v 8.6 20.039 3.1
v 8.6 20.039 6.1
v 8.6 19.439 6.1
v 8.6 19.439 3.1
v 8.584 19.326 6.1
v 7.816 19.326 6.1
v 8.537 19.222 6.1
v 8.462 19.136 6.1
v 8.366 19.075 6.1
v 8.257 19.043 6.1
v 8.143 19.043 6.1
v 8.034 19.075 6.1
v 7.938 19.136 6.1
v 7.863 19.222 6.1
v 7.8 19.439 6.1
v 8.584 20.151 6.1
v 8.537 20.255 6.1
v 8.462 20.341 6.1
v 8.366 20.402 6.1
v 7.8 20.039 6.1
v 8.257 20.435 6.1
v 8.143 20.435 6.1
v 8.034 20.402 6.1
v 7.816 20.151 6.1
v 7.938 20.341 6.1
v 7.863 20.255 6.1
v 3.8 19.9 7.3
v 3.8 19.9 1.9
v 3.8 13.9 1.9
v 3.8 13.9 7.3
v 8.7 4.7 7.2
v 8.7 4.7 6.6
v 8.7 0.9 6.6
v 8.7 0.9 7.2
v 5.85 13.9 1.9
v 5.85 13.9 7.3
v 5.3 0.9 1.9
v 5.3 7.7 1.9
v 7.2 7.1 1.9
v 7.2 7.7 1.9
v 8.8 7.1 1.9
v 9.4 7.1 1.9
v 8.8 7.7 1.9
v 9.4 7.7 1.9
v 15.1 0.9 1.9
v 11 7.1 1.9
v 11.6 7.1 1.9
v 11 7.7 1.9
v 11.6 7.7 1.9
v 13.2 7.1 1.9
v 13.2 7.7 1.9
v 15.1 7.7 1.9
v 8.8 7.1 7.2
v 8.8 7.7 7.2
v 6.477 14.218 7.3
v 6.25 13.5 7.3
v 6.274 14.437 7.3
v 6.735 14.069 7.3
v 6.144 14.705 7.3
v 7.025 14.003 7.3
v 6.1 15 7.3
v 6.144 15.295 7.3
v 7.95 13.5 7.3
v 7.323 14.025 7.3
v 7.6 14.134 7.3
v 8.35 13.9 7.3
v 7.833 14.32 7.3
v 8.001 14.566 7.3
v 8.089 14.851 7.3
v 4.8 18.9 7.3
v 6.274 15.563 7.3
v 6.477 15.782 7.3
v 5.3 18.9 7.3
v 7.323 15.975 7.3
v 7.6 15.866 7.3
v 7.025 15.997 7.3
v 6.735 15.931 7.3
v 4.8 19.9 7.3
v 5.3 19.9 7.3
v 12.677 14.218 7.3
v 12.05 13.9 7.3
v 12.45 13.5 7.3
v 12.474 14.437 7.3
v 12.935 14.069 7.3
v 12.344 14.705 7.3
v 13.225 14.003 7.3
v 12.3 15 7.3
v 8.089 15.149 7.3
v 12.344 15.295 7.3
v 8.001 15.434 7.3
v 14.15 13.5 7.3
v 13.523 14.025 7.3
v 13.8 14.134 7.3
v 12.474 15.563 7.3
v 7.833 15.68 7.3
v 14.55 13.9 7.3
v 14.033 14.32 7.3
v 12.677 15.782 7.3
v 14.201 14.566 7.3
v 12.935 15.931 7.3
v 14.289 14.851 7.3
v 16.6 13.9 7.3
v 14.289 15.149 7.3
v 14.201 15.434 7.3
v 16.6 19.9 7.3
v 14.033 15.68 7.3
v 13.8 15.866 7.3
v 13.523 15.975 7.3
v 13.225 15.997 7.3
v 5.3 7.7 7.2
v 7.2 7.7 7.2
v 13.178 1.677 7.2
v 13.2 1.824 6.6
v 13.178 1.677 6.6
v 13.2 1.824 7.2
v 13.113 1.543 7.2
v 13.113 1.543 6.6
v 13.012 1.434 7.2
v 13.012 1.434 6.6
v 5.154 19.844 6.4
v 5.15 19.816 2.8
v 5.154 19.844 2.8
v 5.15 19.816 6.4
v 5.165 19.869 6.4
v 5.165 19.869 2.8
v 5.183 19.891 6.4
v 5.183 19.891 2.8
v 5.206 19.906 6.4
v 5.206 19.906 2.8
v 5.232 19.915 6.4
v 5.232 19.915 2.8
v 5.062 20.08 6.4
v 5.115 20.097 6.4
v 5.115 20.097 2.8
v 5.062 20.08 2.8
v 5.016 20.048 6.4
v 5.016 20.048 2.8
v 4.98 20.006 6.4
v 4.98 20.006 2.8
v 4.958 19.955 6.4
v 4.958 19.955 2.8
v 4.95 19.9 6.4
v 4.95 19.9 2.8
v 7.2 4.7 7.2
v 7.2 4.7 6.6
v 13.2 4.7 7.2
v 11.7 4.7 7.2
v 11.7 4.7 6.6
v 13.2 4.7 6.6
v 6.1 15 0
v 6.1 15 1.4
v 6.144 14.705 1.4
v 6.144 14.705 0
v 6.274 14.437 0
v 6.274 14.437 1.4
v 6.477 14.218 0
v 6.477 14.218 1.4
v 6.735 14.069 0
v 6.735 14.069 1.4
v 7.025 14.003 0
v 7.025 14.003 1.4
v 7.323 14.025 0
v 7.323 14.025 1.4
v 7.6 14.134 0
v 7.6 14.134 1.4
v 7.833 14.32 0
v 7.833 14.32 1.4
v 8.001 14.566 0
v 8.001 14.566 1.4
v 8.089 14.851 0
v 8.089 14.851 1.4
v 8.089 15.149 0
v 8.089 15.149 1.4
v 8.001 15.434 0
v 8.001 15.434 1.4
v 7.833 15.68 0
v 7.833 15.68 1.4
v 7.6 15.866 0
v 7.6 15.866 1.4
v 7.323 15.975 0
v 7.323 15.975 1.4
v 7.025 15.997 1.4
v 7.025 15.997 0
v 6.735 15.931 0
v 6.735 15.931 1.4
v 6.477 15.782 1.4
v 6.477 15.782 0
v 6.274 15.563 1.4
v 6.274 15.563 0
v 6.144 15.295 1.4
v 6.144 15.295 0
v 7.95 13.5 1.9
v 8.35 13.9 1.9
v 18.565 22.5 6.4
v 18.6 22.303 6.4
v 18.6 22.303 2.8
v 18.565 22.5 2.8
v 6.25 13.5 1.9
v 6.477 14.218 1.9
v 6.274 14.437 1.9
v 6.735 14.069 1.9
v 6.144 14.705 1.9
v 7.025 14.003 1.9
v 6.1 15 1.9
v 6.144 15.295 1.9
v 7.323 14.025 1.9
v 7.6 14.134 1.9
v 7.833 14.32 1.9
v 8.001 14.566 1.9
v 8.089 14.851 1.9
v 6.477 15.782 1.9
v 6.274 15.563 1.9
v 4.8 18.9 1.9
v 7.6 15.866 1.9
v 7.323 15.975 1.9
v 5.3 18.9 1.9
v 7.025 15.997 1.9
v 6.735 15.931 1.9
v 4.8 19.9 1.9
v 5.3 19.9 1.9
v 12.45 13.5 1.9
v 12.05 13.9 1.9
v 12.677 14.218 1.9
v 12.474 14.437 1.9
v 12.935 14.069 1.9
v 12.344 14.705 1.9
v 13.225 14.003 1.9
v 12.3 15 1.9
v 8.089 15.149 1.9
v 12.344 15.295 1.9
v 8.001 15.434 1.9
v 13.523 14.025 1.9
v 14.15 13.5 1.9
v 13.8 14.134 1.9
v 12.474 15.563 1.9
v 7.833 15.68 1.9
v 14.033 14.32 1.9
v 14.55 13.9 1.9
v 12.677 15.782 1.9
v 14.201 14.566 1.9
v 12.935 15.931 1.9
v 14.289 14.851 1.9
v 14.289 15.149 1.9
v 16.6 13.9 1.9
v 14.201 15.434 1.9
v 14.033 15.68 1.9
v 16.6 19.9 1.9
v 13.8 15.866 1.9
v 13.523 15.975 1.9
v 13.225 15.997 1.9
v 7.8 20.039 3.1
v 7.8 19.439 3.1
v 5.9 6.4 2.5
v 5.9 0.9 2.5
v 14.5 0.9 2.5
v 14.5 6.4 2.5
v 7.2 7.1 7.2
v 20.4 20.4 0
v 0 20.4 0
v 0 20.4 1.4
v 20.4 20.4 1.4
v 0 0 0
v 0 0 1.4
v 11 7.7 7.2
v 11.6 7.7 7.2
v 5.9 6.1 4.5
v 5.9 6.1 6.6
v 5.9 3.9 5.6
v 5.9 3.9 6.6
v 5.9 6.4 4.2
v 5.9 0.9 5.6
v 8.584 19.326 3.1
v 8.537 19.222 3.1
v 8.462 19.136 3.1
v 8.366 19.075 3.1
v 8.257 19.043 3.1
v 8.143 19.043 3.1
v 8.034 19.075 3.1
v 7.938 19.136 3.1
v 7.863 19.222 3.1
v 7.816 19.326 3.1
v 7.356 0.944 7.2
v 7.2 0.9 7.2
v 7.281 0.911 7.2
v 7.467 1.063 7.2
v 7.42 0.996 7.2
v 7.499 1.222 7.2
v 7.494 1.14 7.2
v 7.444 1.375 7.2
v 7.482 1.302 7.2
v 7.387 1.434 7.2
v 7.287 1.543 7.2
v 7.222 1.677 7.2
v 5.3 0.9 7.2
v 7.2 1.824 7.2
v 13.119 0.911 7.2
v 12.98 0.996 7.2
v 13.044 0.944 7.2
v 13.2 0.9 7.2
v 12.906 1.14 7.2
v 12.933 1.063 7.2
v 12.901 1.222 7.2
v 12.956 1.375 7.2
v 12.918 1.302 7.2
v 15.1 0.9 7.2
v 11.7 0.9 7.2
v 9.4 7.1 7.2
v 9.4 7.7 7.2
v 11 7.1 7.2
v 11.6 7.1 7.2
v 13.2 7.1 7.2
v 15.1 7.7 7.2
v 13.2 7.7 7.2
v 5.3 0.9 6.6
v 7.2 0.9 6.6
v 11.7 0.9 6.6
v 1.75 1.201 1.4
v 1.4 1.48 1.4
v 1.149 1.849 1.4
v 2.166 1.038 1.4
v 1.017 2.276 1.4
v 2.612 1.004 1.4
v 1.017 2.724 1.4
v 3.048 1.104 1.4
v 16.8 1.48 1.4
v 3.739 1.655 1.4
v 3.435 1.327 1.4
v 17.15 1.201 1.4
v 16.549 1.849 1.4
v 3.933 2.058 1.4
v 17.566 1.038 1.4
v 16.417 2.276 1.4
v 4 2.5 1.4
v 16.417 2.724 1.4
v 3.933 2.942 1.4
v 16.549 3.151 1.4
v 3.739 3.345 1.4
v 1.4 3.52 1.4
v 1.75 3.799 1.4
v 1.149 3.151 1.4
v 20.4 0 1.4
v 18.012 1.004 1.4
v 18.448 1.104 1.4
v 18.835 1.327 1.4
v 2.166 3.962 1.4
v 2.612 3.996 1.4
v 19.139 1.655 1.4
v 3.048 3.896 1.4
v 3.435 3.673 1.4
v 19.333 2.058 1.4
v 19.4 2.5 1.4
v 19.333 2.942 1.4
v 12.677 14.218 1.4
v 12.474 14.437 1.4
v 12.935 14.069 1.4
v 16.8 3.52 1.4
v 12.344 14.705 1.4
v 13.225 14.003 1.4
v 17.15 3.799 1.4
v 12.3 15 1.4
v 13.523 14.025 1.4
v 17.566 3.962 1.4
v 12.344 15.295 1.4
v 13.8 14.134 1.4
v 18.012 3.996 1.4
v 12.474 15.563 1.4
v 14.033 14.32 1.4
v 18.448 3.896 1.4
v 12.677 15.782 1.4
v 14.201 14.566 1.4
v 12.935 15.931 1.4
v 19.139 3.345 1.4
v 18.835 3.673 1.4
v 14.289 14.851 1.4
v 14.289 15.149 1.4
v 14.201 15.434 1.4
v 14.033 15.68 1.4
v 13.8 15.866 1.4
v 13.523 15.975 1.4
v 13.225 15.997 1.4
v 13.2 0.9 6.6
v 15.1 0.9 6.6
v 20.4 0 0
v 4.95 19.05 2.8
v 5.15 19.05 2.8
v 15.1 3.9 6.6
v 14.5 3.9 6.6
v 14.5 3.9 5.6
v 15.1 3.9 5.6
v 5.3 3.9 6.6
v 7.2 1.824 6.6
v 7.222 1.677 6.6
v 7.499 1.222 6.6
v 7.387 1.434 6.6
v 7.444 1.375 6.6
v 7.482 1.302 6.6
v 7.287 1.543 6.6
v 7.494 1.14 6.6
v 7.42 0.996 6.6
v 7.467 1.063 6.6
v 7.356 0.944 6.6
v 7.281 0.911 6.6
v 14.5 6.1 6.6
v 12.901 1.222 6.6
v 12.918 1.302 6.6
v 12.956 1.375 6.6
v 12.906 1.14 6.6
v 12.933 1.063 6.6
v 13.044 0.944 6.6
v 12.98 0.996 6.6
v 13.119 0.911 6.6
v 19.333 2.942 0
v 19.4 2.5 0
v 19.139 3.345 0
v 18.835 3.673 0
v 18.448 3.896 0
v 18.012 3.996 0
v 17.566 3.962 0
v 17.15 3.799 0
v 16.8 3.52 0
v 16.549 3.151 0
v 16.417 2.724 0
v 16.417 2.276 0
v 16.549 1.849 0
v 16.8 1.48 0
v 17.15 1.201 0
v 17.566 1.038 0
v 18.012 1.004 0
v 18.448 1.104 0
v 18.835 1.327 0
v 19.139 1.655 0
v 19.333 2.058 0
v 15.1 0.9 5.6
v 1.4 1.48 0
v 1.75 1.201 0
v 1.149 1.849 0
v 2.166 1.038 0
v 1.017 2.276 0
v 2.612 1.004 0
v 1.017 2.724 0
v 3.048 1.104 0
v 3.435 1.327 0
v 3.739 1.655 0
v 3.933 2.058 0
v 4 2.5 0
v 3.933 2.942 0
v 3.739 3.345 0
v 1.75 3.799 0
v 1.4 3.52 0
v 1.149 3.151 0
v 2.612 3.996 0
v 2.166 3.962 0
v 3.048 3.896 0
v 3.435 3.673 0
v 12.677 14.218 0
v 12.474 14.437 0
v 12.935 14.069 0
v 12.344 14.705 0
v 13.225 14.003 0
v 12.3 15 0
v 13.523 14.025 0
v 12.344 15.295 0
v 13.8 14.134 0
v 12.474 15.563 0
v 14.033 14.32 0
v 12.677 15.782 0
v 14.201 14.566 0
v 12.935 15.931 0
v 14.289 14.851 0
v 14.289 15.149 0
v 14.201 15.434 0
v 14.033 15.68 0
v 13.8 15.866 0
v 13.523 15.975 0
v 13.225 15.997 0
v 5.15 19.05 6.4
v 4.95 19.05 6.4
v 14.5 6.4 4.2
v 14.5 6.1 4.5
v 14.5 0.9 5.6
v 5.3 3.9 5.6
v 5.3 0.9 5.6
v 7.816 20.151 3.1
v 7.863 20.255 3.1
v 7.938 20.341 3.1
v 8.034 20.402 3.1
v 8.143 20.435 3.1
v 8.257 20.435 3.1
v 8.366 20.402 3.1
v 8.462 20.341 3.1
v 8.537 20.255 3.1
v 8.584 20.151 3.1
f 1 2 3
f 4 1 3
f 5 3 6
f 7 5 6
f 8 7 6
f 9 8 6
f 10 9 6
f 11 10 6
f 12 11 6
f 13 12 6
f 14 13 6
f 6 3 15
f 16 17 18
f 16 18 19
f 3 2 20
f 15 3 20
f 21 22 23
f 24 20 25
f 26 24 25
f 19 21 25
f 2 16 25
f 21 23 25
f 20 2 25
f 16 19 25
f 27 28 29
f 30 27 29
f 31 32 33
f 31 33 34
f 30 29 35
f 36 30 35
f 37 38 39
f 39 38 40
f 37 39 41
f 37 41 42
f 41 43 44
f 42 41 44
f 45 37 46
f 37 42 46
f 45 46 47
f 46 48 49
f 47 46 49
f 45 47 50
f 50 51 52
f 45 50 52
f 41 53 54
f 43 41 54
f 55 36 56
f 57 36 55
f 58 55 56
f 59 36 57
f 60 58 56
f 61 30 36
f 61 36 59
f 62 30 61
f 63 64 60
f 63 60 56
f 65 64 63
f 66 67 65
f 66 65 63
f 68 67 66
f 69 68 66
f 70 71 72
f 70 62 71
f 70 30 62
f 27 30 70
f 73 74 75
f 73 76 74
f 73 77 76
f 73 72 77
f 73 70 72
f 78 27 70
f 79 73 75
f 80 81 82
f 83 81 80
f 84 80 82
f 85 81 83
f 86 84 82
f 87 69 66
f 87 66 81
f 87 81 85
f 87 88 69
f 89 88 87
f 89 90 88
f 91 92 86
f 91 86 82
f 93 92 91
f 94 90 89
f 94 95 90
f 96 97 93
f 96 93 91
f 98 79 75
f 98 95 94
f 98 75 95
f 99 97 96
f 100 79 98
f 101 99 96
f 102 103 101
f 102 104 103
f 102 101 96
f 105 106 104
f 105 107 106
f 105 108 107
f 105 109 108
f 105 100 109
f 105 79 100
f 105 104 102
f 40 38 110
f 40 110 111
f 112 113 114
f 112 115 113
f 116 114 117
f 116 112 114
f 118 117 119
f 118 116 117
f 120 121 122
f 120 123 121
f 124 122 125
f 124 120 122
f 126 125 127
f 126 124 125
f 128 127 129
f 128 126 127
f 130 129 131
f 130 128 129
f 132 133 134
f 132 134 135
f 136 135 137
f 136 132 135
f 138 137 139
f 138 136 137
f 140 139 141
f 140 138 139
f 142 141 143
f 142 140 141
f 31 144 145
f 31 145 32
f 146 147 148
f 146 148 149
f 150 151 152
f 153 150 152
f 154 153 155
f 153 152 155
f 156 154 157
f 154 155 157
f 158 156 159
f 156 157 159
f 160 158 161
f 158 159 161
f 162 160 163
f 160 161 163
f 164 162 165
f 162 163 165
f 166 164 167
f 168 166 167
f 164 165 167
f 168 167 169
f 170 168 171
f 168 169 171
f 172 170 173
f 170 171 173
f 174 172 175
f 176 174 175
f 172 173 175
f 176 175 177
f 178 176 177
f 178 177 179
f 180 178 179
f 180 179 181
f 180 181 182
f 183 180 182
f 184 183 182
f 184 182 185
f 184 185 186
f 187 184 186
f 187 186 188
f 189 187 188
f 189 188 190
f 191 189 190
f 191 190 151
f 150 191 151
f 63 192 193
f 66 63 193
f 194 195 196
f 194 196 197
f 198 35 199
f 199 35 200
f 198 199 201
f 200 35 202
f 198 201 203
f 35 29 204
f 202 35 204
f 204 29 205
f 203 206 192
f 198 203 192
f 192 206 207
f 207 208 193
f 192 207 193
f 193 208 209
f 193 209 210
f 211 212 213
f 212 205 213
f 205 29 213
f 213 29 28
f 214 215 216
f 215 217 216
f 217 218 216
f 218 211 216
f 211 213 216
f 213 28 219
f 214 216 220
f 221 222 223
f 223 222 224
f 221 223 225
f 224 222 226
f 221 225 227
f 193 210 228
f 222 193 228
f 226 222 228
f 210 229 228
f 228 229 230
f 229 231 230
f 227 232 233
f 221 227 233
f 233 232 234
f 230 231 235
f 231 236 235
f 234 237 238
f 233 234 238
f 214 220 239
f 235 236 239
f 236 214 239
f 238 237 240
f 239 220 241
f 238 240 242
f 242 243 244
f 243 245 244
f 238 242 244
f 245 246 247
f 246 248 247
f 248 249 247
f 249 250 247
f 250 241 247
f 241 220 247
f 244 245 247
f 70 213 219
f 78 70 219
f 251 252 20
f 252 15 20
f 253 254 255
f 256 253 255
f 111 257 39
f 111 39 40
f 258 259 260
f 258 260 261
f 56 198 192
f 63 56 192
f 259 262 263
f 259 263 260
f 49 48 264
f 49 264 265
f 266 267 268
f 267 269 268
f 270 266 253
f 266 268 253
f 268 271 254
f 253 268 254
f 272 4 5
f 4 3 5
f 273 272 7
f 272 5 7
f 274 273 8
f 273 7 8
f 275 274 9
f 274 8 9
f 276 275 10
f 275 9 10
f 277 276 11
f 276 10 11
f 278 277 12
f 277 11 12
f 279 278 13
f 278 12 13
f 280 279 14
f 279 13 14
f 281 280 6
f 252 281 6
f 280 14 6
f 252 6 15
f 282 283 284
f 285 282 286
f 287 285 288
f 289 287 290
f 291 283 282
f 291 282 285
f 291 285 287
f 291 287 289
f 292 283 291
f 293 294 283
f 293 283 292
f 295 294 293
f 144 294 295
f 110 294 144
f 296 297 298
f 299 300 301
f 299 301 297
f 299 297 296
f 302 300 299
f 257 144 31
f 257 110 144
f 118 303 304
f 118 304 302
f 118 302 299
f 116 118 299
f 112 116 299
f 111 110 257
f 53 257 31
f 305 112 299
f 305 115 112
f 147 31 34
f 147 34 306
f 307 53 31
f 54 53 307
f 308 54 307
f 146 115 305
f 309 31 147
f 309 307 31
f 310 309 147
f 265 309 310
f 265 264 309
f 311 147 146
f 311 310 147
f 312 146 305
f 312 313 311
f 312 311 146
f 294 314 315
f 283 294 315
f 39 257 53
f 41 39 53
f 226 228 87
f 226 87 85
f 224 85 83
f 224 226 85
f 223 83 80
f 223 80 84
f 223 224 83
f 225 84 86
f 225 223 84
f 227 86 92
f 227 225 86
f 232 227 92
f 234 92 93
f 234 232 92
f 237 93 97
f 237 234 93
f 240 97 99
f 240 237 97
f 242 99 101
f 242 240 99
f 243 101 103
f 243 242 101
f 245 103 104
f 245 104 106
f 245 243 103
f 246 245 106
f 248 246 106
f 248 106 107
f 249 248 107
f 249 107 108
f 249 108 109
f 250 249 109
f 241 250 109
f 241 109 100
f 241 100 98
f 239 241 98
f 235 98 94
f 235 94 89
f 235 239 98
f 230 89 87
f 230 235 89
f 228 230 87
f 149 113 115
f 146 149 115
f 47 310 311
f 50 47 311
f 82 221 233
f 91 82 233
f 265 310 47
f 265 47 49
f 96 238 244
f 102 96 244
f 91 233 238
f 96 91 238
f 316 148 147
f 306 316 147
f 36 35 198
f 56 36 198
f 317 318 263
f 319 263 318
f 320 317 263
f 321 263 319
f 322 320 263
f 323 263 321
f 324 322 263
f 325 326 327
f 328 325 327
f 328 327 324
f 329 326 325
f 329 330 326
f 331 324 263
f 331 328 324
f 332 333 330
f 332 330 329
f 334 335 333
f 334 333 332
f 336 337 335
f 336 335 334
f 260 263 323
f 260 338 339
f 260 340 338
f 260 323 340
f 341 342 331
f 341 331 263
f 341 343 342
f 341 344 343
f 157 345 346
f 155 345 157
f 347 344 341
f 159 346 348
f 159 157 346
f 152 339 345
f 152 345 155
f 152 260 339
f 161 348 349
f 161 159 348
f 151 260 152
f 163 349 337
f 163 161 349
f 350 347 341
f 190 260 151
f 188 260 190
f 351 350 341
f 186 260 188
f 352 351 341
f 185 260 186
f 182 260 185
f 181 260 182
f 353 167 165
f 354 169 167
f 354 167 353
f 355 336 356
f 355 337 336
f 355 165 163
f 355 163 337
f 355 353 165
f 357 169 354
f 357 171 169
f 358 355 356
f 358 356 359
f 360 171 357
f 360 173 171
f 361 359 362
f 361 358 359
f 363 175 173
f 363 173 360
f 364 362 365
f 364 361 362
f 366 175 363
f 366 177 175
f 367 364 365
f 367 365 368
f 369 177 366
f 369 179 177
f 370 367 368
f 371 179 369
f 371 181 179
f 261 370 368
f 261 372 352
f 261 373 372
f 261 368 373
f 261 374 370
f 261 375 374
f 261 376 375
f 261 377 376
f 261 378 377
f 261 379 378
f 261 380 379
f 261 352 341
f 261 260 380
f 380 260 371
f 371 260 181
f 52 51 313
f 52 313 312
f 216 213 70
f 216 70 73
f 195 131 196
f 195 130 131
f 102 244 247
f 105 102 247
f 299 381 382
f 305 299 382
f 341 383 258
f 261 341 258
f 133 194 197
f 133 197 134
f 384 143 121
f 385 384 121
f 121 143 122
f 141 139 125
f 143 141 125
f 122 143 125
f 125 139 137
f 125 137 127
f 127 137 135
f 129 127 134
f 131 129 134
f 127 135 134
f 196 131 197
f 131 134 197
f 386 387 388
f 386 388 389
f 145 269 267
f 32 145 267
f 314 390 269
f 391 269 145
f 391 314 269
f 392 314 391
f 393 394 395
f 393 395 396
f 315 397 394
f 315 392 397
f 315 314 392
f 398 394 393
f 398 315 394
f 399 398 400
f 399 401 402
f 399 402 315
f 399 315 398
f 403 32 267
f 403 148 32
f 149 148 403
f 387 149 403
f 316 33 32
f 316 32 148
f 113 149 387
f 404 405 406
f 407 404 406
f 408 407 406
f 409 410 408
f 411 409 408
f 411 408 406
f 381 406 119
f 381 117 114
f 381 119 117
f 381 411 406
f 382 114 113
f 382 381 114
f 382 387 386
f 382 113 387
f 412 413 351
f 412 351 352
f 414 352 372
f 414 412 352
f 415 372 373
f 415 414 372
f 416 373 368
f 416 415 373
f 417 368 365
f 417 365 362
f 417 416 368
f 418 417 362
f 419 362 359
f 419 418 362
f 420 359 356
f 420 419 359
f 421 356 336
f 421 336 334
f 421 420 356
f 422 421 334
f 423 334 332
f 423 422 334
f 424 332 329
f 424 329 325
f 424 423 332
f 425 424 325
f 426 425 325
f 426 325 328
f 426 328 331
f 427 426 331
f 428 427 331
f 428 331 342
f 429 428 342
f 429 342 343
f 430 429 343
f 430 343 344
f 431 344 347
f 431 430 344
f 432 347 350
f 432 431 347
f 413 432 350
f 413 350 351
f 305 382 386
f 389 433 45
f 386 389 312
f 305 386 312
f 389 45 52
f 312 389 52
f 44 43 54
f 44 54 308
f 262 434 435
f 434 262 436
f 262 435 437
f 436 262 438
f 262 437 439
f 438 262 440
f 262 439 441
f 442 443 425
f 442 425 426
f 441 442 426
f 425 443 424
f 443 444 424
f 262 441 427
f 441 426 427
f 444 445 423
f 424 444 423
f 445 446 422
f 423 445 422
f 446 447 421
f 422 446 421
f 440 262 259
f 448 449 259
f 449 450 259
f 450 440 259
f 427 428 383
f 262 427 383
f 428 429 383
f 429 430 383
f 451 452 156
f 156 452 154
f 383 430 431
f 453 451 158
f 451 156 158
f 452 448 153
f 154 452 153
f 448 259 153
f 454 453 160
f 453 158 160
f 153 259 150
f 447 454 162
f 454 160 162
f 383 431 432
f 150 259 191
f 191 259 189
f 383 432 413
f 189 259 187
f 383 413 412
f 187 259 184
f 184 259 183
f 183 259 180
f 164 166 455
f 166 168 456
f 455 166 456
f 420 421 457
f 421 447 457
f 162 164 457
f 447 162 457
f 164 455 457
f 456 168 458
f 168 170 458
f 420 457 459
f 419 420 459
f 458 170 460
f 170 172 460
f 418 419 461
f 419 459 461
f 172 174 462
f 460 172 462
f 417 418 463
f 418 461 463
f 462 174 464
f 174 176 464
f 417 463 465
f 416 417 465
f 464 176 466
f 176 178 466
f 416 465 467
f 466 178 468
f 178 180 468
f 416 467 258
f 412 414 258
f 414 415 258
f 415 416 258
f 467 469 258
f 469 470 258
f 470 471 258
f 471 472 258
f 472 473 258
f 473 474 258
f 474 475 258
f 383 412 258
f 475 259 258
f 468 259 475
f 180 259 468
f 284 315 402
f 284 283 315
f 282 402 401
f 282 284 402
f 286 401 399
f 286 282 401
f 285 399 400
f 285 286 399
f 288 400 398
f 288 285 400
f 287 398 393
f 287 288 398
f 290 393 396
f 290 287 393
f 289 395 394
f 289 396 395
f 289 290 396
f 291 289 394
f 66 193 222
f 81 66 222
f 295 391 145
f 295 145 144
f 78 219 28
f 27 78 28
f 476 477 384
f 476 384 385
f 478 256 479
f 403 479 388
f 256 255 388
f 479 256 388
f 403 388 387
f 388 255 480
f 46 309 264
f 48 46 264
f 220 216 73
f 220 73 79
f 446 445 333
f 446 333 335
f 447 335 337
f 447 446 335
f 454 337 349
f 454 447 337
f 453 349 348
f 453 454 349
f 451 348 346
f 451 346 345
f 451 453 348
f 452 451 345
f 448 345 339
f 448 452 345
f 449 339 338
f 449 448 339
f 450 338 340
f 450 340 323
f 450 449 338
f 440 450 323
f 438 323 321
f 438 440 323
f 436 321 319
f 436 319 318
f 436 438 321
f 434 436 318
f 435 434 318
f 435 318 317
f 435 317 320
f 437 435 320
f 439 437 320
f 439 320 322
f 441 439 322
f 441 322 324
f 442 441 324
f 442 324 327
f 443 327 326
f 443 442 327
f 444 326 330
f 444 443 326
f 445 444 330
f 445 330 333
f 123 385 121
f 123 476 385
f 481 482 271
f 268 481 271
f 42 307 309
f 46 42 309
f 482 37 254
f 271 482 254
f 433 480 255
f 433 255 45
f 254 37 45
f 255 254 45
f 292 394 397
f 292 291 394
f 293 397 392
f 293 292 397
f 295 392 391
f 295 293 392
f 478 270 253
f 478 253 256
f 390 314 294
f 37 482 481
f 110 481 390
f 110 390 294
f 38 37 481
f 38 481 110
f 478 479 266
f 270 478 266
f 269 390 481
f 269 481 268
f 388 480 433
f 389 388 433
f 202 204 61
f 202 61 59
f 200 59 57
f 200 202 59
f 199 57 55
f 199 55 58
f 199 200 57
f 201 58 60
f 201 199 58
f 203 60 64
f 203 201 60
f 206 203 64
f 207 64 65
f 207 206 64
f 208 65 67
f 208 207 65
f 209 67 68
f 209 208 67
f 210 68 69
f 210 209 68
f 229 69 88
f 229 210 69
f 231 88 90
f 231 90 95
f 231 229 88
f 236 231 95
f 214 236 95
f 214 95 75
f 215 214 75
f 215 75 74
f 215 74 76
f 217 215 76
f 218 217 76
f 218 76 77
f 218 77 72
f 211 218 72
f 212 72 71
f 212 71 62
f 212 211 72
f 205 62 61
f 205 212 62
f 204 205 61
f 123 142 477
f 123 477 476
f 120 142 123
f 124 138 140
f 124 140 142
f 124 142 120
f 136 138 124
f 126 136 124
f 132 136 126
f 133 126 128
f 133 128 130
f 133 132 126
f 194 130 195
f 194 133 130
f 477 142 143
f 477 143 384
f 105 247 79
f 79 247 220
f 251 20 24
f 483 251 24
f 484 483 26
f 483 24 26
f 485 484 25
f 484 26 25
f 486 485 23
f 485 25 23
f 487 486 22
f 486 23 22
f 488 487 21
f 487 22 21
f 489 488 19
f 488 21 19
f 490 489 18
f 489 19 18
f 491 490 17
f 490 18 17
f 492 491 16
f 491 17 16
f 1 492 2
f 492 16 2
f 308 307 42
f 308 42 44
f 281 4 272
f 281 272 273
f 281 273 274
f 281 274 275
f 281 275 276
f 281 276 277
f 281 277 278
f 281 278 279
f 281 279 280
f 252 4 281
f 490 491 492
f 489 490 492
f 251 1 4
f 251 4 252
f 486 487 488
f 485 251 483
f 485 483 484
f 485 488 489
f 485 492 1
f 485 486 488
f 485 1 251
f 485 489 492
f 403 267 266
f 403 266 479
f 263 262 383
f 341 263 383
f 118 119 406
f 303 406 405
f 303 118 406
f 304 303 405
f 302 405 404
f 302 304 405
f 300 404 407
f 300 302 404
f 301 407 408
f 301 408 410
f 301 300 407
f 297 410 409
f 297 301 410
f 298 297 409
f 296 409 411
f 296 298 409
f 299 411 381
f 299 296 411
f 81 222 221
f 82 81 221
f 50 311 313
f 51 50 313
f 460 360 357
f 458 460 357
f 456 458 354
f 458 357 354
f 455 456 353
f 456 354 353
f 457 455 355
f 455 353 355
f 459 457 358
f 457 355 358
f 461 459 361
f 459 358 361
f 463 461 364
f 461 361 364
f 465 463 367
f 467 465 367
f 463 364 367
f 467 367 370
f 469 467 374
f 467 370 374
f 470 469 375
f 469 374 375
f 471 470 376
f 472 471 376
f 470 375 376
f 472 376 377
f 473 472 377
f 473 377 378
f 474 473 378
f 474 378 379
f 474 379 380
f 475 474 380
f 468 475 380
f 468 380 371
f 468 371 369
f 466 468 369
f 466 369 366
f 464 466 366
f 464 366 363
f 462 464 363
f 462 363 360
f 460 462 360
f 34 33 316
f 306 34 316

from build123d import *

# Parameters (mm, degrees)
SKETCH_1_W               = 20.4
SKETCH_1_H               = 20.4
SKETCH_1_R               = 1.5
EXTRUDE_1_DEPTH          = 1.4
EXTRUDE_START            = 0.5
SKETCH_2_W               = 9.8
SKETCH_2_H               = 6.8
EXTRUDE_2_DEPTH          = 5.3
SKETCH_3_W               = 0.6
SKETCH_3_H               = 1
CUT_EXTRUDE_1_DEPTH      = 3
SKETCH_3_3_W             = 1.5
SKETCH_3_3_H             = 0.6
CUT_EXTRUDE_2_DEPTH      = 3.8
SKETCH_3_4_W             = 8.6
SKETCH_3_4_H             = 3.1
CUT_EXTRUDE_3_DEPTH      = 5.2
CUT_EXTRUDE_4_DEPTH      = 0.3
CHAMFER_1_SIZE           = 0.3
SKETCH_5_R               = 0.3
EXTRUDE_3_DEPTH          = 0.6
FILLET_2_R               = 0.5
SKETCH_6_W               = 1.6
SKETCH_6_H               = 0.6
CUT_EXTRUDE_5_DEPTH      = 5.3
SKETCH_7_R               = 1
EXTRUDE_4_DEPTH          = 5.4
SKETCH_8_R               = 1
CUT_EXTRUDE_6_DEPTH      = 30.447071162
CUT_EXTRUDE_9_DEPTH      = 30.214380021
CUT_EXTRUDE_9_DEPTH_BACK = 30.214380021
SKETCH_10_W              = 0.5
SKETCH_10_H              = 1
EXTRUDE_5_DEPTH          = 1.8
EXTRUDE_6_DEPTH          = 1.5


with BuildPart() as part:
    # Эскиз1 → Бобышка-Вытянуть1 (new body)
    with BuildSketch(Plane.XY):
        with Locations((10.2, 10.2)):
            Rectangle(SKETCH_1_W, SKETCH_1_H)
        with Locations((17.9, 2.5)):
            Circle(SKETCH_1_R, mode=Mode.SUBTRACT)
        with Locations((2.5, 2.5)):
            Circle(SKETCH_1_R, mode=Mode.SUBTRACT)
    extrude(amount=EXTRUDE_1_DEPTH)

    # Эскиз8 → Вырез-Вытянуть6 (cut, through all)
    with BuildSketch(Plane.XY.offset(1.4)):
        with Locations(Location((13.3, 15, 0), (0, 0, 180))):
            Circle(SKETCH_8_R)
        with Locations(Location((7.1, 15, 0), (0, 0, 180))):
            Circle(SKETCH_8_R)
    extrude(amount=-CUT_EXTRUDE_6_DEPTH, mode=Mode.SUBTRACT)


with BuildPart() as body_2:
    # Эскиз2 → Бобышка-Вытянуть2 (new body)
    with BuildSketch(Plane.XY.offset(1.4).offset(EXTRUDE_START)):
        with Locations((10.2, 4.3)):
            Rectangle(SKETCH_2_W, SKETCH_2_H)
    extrude(amount=EXTRUDE_2_DEPTH)

    # Эскиз3 → Вырез-Вытянуть1 (cut)
    with BuildSketch(Plane.XZ.offset(-0.9)):
        with Locations((5.6, 6.1)):
            Rectangle(SKETCH_3_W, SKETCH_3_H)
        with Locations((14.8, 6.1)):
            Rectangle(SKETCH_3_W, SKETCH_3_H)
    extrude(amount=-CUT_EXTRUDE_1_DEPTH, mode=Mode.SUBTRACT)

    # Эскиз3<3> → Вырез-Вытянуть2 (cut)
    with BuildSketch(Plane.XZ.offset(-0.9)):
        with Locations((7.95, 6.9)):
            Rectangle(SKETCH_3_3_W, SKETCH_3_3_H)
        with Locations((12.45, 6.9)):
            Rectangle(SKETCH_3_3_W, SKETCH_3_3_H)
    extrude(amount=-CUT_EXTRUDE_2_DEPTH, mode=Mode.SUBTRACT)

    # Эскиз3<4> → Вырез-Вытянуть3 (cut)
    with BuildSketch(Plane.XZ.offset(-0.9)):
        with Locations((10.2, 4.05)):
            Rectangle(SKETCH_3_4_W, SKETCH_3_4_H)
        Polygon((5.9, 6.6), (5.9, 5.6), (14.5, 5.6), (14.5, 6.6), (13.2, 6.6), (11.7, 6.6), (8.7, 6.6), (7.2, 6.6), align=None)
    extrude(amount=-CUT_EXTRUDE_3_DEPTH, mode=Mode.SUBTRACT)

    # Эскиз4 → Вырез-Вытянуть4 (cut)
    with BuildSketch(Plane.XZ.offset(-6.1)):
        Polygon((7.2, 4.2), (5.9, 4.2), (5.9, 2.5), (14.5, 2.5), (14.5, 4.2), align=None)
    extrude(amount=-CUT_EXTRUDE_4_DEPTH, mode=Mode.SUBTRACT)

    # Фаска1
    chamfer_1_edges = [body_2.edges().sort_by_distance(p)[0] for p in [
        (10.2, 6.1, 4.2),
    ]]
    chamfer(chamfer_1_edges, length=CHAMFER_1_SIZE - 0.0001)  # a hair under: the kernel refuses the full size

    # Эскиз5 → Бобышка-Вытянуть3 (add)
    with BuildSketch(Plane.XY.offset(7.2)):
        with Locations((13.2, 1.2)):
            Circle(SKETCH_5_R)
        with Locations((7.2, 1.2)):
            Circle(SKETCH_5_R)
    extrude(amount=-EXTRUDE_3_DEPTH)

    # Скругление2
    fillet_2_edges = [body_2.edges().sort_by_distance(p)[0] for p in [
        (13.2, 1.5, 6.9),
        (7.2, 1.5, 6.9),
    ]]
    fillet(fillet_2_edges, radius=FILLET_2_R)

    # Эскиз6 → Вырез-Вытянуть5 (cut)
    with BuildSketch(Plane.XY.offset(7.2)):
        with Locations((8, 7.4)):
            Rectangle(SKETCH_6_W, SKETCH_6_H)
        with Locations((10.2, 7.4)):
            Rectangle(SKETCH_6_W, SKETCH_6_H)
        with Locations((12.4, 7.4)):
            Rectangle(SKETCH_6_W, SKETCH_6_H)
    extrude(amount=-CUT_EXTRUDE_5_DEPTH, mode=Mode.SUBTRACT)


with BuildPart() as body_3:
    # Эскиз7 → Бобышка-Вытянуть4 (new body)
    # profile 1 of 5: a face of its own
    with BuildSketch(Plane.XY.offset(1.4).offset(EXTRUDE_START)):
        Polygon((3.8, 19.9), (3.8, 13.9), (5.85, 13.9), (8.35, 13.9), (12.05, 13.9), (14.55, 13.9), (16.6, 13.9), (16.6, 19.9), align=None)
        with Locations(Location((7.1, 15, 0), (0, 0, 180))):
            Circle(SKETCH_7_R, mode=Mode.SUBTRACT)
        with Locations(Location((13.3, 15, 0), (0, 0, 180))):
            Circle(SKETCH_7_R, mode=Mode.SUBTRACT)
    # profile 2 of 5: a face of its own
    with BuildSketch(Plane.XY.offset(1.4).offset(EXTRUDE_START)):
        Polygon((8.35, 13.9), (5.85, 13.9), (6.25, 13.5), (7.1, 13.5), (7.95, 13.5), align=None)
    # profile 3 of 5: a face of its own
    with BuildSketch(Plane.XY.offset(1.4).offset(EXTRUDE_START)):
        Polygon((14.55, 13.9), (12.05, 13.9), (12.45, 13.5), (14.15, 13.5), align=None)
    # profile 4 of 5: a face of its own
    with BuildSketch(Plane.XY.offset(1.4).offset(EXTRUDE_START)):
        Polygon((3.8, 19.9), (3.8, 13.9), (5.85, 13.9), (8.35, 13.9), (12.05, 13.9), (14.55, 13.9), (16.6, 13.9), (16.6, 19.9), align=None)
        with Locations(Location((7.1, 15, 0), (0, 0, 180))):
            Circle(SKETCH_7_R, mode=Mode.SUBTRACT)
        with Locations(Location((13.3, 15, 0), (0, 0, 180))):
            Circle(SKETCH_7_R, mode=Mode.SUBTRACT)
    # profile 5 of 5: a face of its own
    with BuildSketch(Plane.XY.offset(1.4).offset(EXTRUDE_START)):
        Polygon((3.8, 19.9), (3.8, 13.9), (5.85, 13.9), (8.35, 13.9), (12.05, 13.9), (14.55, 13.9), (16.6, 13.9), (16.6, 19.9), align=None)
        with Locations(Location((7.1, 15, 0), (0, 0, 180))):
            Circle(SKETCH_7_R, mode=Mode.SUBTRACT)
        with Locations(Location((13.3, 15, 0), (0, 0, 180))):
            Circle(SKETCH_7_R, mode=Mode.SUBTRACT)
    extrude(amount=EXTRUDE_4_DEPTH)

    # Эскиз10 → Вырез-Вытянуть9 (cut, two sides: drawn at the far end of the back side and taken through both)
    with BuildSketch(Plane.XY.offset(4.6).offset(-CUT_EXTRUDE_9_DEPTH_BACK)):
        with Locations((5.05, 19.4)):
            Rectangle(SKETCH_10_W, SKETCH_10_H)
    extrude(amount=CUT_EXTRUDE_9_DEPTH + CUT_EXTRUDE_9_DEPTH_BACK, mode=Mode.SUBTRACT)


with BuildPart() as body_4:
    # Эскиз11 → Бобышка-Вытянуть5 (new, symmetric)
    with BuildSketch(Plane.XY.offset(4.6)):
        with BuildLine():
            Line((5.232411488, 19.914724499), (18.6, 22.30311786))
            Line((18.6, 22.30311786), (18.564822975, 22.5))
            Line((18.564822975, 22.5), (5.114822975, 20.09688214))
            ThreePointArc((5.114822975, 20.09688214), (4.996645175, 20.0283834), (4.95, 19.9))
            Line((4.95, 19.9), (4.95, 19.896059192))
            Line((4.95, 19.896059192), (4.95, 19.05))
            Line((4.95, 19.05), (5.15, 19.05))
            Line((5.15, 19.05), (5.15, 19.81628343))
            ThreePointArc((5.15, 19.81628343), (5.173322587, 19.88047513), (5.232411488, 19.914724499))
        make_face()
    extrude(amount=EXTRUDE_5_DEPTH, both=True)


with BuildPart() as body_5:
    # Эскиз12 → Бобышка-Вытянуть6 (new, symmetric)
    with BuildSketch(Plane.XY.offset(4.6)):
        with BuildLine():
            Line((8.6, 20.038610472), (8.6, 19.438610472))
            ThreePointArc((8.6, 19.438610472), (8.2, 19.038610472), (7.8, 19.438610472))
            Line((7.8, 19.438610472), (7.8, 20.038610472))
            ThreePointArc((7.8, 20.038610472), (8.2, 20.438610472), (8.6, 20.038610472))
        make_face()
    extrude(amount=EXTRUDE_6_DEPTH, both=True)


solid = Compound([part.part, body_2.part, body_3.part, body_4.part, body_5.part])
